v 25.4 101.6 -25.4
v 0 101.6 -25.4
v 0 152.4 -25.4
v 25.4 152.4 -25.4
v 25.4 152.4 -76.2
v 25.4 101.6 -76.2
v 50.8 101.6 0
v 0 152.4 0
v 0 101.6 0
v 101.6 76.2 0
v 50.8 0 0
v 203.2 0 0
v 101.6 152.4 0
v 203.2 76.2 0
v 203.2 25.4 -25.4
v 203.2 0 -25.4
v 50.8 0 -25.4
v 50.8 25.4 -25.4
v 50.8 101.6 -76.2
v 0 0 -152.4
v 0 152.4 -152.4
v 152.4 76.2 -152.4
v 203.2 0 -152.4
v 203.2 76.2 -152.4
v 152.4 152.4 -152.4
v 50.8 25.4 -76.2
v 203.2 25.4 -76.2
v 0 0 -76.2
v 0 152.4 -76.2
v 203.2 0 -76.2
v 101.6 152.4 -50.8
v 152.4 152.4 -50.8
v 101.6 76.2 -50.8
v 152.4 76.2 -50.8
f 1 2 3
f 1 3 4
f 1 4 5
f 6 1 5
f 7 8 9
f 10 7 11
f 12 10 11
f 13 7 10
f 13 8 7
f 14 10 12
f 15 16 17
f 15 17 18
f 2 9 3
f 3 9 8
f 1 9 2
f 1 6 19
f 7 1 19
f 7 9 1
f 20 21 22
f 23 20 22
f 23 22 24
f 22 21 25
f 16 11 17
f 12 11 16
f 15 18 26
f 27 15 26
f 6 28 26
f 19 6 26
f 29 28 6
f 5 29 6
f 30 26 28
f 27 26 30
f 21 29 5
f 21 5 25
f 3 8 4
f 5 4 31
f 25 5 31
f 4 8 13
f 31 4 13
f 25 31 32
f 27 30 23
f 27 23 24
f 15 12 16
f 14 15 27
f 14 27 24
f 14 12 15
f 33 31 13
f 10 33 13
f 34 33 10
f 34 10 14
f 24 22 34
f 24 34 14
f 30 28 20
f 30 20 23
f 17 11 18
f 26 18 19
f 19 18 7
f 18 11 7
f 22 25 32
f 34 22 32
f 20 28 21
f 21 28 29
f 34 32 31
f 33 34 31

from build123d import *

# Parameters (mm, degrees)
SKETCH2_W           = 203.2
SKETCH2_H           = 152.4
BOSS_EXTRUDE1_DEPTH = 152.4
SKETCH4_W           = 50.8
SKETCH4_H           = 101.6
CUT_EXTRUDE1_DEPTH  = 76.2
SKETCH5_W           = 25.4
SKETCH5_H           = 50.8
CUT_EXTRUDE2_DEPTH  = 76.2
SKETCH6_W           = 50.8
SKETCH6_H           = 25.4
CUT_EXTRUDE3_DEPTH  = 152.4
CUT_EXTRUDE4_DEPTH  = 76.2


with BuildPart() as part:
    # Sketch2 → Boss-Extrude1 (new body)
    with BuildSketch(Plane.XY):
        with Locations((101.6, 76.2)):
            Rectangle(SKETCH2_W, SKETCH2_H)
    extrude(amount=-BOSS_EXTRUDE1_DEPTH)

    # Sketch4 → Cut-Extrude1 (cut)
    with BuildSketch(Plane.XY):
        with Locations((25.4, 50.8)):
            Rectangle(SKETCH4_W, SKETCH4_H)
    extrude(amount=-CUT_EXTRUDE1_DEPTH, mode=Mode.SUBTRACT)

    # Sketch5 → Cut-Extrude2 (cut)
    with BuildSketch(Plane(origin=(0, 152.4, 0), x_dir=(1, 0, 0), z_dir=(0, 1, 0))):
        with Locations((12.7, 50.8)):
            Rectangle(SKETCH5_W, SKETCH5_H)
    extrude(amount=-CUT_EXTRUDE2_DEPTH, mode=Mode.SUBTRACT)

    # Sketch6 → Cut-Extrude3 (cut)
    with BuildSketch(Plane(origin=(203.2, 0, 0), x_dir=(0, 0, -1), z_dir=(1, 0, 0))):
        with Locations((50.8, 12.7)):
            Rectangle(SKETCH6_W, SKETCH6_H)
    extrude(amount=-CUT_EXTRUDE3_DEPTH, mode=Mode.SUBTRACT)

    # Sketch7 → Cut-Extrude4 (cut)
    with BuildSketch(Plane(origin=(0, 152.4, 0), x_dir=(1, 0, 0), z_dir=(0, 1, 0))):
        Polygon((152.4, 152.4), (152.4, 50.8), (101.6, 50.8), (101.6, 0), (203.2, 0), (203.2, 152.4), align=None)
    extrude(amount=-CUT_EXTRUDE4_DEPTH, mode=Mode.SUBTRACT)


solid = part.part
